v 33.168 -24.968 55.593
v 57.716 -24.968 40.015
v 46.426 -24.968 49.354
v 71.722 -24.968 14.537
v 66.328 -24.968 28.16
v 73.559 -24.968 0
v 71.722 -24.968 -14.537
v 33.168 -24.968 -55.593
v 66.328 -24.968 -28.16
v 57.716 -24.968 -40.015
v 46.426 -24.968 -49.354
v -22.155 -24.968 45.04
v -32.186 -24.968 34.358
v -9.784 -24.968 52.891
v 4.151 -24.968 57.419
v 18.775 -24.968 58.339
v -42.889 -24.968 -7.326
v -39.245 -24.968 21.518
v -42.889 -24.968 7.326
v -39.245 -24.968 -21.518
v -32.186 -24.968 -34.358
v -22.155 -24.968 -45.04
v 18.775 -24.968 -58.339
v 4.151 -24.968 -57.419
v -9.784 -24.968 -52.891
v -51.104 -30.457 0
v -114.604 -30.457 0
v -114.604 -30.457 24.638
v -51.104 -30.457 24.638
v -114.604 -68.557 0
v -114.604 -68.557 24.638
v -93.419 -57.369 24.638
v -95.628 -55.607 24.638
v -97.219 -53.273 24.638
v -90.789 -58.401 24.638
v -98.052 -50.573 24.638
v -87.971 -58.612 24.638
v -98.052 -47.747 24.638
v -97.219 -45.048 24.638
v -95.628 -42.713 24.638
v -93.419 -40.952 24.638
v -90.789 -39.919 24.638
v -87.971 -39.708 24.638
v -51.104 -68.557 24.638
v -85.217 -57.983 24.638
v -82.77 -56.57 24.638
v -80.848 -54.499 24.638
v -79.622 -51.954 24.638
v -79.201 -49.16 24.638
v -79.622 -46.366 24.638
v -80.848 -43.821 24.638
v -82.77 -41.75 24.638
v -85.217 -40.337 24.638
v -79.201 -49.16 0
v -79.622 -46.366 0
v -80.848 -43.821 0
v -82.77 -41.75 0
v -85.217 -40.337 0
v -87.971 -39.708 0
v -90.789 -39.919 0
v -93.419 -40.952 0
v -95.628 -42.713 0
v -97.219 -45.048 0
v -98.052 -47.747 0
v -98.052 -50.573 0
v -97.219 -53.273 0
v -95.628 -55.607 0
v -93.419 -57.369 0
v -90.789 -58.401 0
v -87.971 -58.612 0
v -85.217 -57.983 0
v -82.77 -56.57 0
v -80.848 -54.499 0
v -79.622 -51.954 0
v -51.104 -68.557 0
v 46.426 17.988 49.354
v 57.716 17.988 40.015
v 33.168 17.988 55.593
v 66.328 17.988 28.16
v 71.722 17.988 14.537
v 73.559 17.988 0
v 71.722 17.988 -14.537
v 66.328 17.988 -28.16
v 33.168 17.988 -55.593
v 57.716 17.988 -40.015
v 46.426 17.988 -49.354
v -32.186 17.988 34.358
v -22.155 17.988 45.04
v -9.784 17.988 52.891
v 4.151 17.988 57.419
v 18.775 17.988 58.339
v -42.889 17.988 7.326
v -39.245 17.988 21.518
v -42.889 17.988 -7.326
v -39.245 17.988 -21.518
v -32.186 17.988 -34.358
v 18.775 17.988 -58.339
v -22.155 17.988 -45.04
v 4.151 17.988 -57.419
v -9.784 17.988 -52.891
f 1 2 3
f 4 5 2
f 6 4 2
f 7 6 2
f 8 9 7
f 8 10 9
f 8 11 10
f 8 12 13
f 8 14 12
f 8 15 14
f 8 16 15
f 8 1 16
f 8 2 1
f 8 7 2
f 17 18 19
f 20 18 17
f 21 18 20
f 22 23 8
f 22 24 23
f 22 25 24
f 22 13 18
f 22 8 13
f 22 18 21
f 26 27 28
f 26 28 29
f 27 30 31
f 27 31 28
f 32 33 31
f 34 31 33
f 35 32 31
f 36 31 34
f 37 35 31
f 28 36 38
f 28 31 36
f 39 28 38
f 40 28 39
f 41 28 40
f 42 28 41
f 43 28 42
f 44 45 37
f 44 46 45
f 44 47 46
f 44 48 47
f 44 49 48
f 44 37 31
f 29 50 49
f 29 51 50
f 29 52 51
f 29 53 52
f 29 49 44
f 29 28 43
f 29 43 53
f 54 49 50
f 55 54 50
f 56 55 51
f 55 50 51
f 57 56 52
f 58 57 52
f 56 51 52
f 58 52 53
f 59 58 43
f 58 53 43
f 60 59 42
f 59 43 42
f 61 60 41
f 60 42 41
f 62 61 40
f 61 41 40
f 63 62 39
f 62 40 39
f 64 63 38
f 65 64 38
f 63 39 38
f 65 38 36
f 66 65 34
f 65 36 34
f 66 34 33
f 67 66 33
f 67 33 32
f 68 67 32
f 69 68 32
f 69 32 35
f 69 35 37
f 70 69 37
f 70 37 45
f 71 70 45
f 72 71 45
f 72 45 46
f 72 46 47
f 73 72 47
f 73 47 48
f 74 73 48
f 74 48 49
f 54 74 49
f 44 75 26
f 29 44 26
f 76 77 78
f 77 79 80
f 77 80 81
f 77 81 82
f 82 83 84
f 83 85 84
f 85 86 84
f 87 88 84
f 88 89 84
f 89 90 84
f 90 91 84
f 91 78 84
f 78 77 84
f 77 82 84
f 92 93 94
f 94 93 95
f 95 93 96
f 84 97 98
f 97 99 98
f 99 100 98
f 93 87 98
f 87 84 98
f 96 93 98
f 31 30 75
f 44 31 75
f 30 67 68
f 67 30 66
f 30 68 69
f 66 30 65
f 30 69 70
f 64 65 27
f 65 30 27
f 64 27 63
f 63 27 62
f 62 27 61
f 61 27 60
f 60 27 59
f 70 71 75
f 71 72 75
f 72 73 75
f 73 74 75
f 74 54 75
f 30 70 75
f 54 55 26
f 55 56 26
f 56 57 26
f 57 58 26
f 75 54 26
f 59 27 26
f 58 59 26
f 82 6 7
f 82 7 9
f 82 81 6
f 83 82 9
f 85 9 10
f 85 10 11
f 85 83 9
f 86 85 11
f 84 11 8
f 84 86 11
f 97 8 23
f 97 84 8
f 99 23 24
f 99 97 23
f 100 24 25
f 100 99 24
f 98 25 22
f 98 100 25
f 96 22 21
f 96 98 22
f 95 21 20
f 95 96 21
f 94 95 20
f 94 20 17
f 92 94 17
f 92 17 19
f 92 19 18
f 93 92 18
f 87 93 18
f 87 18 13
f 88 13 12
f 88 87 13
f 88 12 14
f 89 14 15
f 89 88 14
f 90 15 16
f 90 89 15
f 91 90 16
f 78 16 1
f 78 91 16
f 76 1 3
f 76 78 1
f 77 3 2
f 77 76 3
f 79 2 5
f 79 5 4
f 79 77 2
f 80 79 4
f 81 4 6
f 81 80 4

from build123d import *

# Parameters (mm, degrees)
F0_W     = 58.4540003911
F0_H     = 42.9563447833
F2_W     = 63.5
F2_H     = 38.1
F3_DEPTH = 24.638
F4_R     = 9.4783028177
F5_DEPTH = 72.136


with BuildPart() as f1:
    # F0 (on Top) → F1 (revolve)
    with BuildSketch(Plane.XY):
        with Locations((44.3315166049, -3.4902561456)):
            Rectangle(F0_W, F0_H)
    revolve(axis=Axis((15.1045164093, -3.4902561456, 0), (0, 1, 0)))


with BuildPart() as f3:
    # F2 (on Top) → F3 (new body)
    with BuildSketch(Plane.XY):
        with Locations((-82.8541815281, -49.5069261576)):
            Rectangle(F2_W, F2_H)
    extrude(amount=F3_DEPTH)

    # F4 (on face) → F5 (cut)
    with BuildSketch(Plane.XY.offset(24.638)):
        with Locations((-88.6796563864, -49.1600558162)):
            Circle(F4_R)
    extrude(amount=-F5_DEPTH, mode=Mode.SUBTRACT)


solid = Compound([f1.part, f3.part])
